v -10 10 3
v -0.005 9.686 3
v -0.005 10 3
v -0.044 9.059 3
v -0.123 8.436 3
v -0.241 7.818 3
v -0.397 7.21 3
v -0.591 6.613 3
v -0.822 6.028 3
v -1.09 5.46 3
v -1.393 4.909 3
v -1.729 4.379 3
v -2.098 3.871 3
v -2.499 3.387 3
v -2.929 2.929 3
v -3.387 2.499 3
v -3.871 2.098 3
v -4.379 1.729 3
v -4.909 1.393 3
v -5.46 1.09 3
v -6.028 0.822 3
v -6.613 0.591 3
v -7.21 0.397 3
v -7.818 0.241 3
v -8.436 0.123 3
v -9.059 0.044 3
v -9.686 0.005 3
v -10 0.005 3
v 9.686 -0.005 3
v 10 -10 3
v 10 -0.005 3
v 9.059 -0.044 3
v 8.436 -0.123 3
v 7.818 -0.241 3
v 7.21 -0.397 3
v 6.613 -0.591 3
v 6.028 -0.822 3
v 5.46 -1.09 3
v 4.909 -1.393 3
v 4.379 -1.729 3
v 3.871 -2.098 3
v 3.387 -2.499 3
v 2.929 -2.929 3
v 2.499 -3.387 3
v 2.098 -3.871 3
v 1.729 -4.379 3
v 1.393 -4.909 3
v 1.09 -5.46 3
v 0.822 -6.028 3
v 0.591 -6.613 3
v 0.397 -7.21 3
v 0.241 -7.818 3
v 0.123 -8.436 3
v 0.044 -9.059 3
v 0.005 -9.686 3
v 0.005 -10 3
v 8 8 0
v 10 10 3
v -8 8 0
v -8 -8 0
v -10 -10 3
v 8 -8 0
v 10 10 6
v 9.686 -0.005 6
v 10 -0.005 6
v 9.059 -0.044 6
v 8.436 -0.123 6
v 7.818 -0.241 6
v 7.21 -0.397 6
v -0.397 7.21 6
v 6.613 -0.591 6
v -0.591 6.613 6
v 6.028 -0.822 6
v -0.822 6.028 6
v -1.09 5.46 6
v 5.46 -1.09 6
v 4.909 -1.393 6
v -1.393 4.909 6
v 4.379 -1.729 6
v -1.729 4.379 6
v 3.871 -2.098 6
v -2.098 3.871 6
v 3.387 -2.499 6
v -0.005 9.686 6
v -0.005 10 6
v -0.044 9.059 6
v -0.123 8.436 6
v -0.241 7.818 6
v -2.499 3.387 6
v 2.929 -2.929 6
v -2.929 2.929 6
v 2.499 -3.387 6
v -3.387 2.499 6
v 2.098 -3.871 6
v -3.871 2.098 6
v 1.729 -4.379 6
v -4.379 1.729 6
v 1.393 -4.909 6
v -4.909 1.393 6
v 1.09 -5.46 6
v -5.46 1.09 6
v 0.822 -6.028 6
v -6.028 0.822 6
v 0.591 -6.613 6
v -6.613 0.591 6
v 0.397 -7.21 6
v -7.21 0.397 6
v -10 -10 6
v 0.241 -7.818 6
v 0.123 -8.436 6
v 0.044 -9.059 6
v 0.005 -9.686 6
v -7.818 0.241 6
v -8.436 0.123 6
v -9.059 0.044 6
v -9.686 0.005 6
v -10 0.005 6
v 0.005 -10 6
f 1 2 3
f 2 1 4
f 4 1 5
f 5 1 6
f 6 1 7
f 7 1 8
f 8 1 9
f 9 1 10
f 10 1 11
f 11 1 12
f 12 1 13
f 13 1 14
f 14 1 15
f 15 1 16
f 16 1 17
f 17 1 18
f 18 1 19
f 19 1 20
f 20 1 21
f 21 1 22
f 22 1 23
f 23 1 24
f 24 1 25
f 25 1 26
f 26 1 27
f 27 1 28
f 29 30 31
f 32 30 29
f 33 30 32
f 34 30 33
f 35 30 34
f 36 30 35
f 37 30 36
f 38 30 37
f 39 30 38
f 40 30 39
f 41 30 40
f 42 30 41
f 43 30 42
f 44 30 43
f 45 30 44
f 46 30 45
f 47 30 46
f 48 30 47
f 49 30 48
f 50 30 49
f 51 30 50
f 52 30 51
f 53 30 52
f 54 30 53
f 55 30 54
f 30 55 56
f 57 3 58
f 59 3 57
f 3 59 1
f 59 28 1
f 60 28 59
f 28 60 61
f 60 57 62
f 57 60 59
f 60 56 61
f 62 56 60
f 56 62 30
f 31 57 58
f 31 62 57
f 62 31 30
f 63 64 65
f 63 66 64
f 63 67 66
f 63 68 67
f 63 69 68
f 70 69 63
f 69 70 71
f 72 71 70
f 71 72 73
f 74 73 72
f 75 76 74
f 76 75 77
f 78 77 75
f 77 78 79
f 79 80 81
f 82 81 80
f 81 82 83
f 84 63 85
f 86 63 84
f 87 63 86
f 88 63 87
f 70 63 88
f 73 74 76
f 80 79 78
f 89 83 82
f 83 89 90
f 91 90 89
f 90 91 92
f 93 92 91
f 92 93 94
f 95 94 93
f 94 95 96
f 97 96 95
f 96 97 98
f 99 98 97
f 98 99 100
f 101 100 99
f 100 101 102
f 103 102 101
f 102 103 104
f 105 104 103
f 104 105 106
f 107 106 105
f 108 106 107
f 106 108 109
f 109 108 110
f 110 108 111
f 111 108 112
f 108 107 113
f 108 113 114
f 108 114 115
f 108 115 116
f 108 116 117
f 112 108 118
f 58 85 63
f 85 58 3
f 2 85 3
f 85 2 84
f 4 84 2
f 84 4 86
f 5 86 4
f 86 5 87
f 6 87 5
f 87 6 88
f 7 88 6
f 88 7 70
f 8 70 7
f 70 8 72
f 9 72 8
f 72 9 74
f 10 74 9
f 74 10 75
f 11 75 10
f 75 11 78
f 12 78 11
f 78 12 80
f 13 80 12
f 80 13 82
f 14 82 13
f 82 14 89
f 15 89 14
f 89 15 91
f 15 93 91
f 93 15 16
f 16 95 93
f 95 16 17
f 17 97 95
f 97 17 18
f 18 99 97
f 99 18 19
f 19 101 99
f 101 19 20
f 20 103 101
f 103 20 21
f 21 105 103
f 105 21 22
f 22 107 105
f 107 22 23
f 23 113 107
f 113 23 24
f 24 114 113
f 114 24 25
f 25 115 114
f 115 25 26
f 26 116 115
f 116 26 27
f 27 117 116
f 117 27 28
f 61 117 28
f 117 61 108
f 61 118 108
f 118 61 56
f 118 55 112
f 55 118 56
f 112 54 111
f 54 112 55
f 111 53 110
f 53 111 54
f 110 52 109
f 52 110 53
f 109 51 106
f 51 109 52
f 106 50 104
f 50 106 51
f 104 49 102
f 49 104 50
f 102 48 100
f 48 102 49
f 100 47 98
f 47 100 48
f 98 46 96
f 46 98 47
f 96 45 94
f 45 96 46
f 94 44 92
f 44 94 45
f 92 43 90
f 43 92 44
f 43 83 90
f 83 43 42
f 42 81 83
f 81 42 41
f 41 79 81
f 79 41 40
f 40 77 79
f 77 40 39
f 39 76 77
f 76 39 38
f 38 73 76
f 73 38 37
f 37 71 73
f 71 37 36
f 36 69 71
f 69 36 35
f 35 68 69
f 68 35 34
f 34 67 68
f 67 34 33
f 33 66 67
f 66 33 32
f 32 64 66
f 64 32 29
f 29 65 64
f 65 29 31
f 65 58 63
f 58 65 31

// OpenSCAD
// height of the curvy part as a proportion of the height of the base
h=1; // [0:0.01:5]
// ratio between diammeters of bottom and top
bevel=0.8; // [0:0.01:1]
// length of each edge
size=20; // [0:1:100]
// height of the tile
depth=6; // [0:1:30]
// the number of sides
sides=4; // [4,6,8,12]
// which tile to use (there are 2 squares, 3 hexagons, 6 octagons; 28 dodecagons)
tile=0;

module arc(n,i1,i2) {
    d = 2*(i2-i1);
    if(d==n) {
        an = 360*(i1+i2+1)/2/n;
        p = [cos(an),sin(an)];
        difference() {
            circle(1,$fn=100);
            rotate(an) translate([-2,-1,0]) square(2);
        }
    } else if(d>n) {
        difference() {
            circle(1,$fn=100);
            arc(n,i2,i1+n);
        }
    } else {
        a1 = 360*(i1+.5)/n;
        a2 = 360*(i2+.5)/n;
        inradius = sin(180*(n-2)/n/2);
        p1 = [cos(a1),sin(a1)];
        p2 = [cos(a2),sin(a2)];
        w = p1[0]*p2[1]-p1[1]*p2[0];
        R = cos(180/n);

        p = R/w*[-p1[1]+p2[1], -p2[0]+p1[0]];
        aR = norm(inradius*p1-p);
        
        translate(p) circle(aR,$fn=100);
    }
}

module combine_arcs(n,i1,i2,subarcs) {
    difference() {
        arc(n,i1,i2);
        for(s=subarcs) {
            combine_arcs(n,s[0],s[1],s[2]);
        }
    };
}


tilesets = [[[[0,1,[]],[2,3,[]]],[[0,3,[[1,2,[]]]]]],[[[0,1,[]],[2,3,[]],[4,5,[]]],[[0,1,[]],[2,5,[[3,4,[]]]]],[[0,5,[[1,2,[]],[3,4,[]]]]]],[[[0,1,[]],[2,3,[]],[4,5,[]],[6,7,[]]],[[0,1,[]],[2,3,[]],[4,7,[[5,6,[]]]]],[[0,1,[]],[2,7,[[3,4,[]],[5,6,[]]]]],[[0,1,[]],[2,7,[[3,6,[[4,5,[]]]]]]],[[0,3,[[1,2,[]]]],[4,7,[[5,6,[]]]]],[[0,7,[[1,2,[]],[3,4,[]],[5,6,[]]]]]],[[[0,1,[]],[2,3,[]],[4,5,[]],[6,7,[]],[8,9,[]]],[[0,1,[]],[2,3,[]],[4,5,[]],[6,9,[[7,8,[]]]]],[[0,1,[]],[2,3,[]],[4,9,[[5,6,[]],[7,8,[]]]]],[[0,1,[]],[2,3,[]],[4,9,[[5,8,[[6,7,[]]]]]]],[[0,1,[]],[2,5,[[3,4,[]]]],[6,9,[[7,8,[]]]]],[[0,1,[]],[2,9,[[3,4,[]],[5,6,[]],[7,8,[]]]]],[[0,1,[]],[2,9,[[3,4,[]],[5,8,[[6,7,[]]]]]]],[[0,3,[[1,2,[]]]],[4,9,[[5,6,[]],[7,8,[]]]]],[[0,3,[[1,2,[]]]],[4,9,[[5,8,[[6,7,[]]]]]]],[[0,9,[[1,2,[]],[3,4,[]],[5,6,[]],[7,8,[]]]]]],[[[0,1,[]],[2,3,[]],[4,5,[]],[6,7,[]],[8,9,[]],[10,11,[]]],[[0,1,[]],[2,3,[]],[4,5,[]],[6,7,[]],[8,11,[[9,10,[]]]]],[[0,1,[]],[2,3,[]],[4,5,[]],[6,11,[[7,8,[]],[9,10,[]]]]],[[0,1,[]],[2,3,[]],[4,5,[]],[6,11,[[7,10,[[8,9,[]]]]]]],[[0,1,[]],[2,3,[]],[4,7,[[5,6,[]]]],[8,11,[[9,10,[]]]]],[[0,1,[]],[2,3,[]],[4,11,[[5,6,[]],[7,8,[]],[9,10,[]]]]],[[0,1,[]],[2,3,[]],[4,11,[[5,6,[]],[7,10,[[8,9,[]]]]]]],[[0,1,[]],[2,3,[]],[4,11,[[5,8,[[6,7,[]]]],[9,10,[]]]]],[[0,1,[]],[2,3,[]],[4,11,[[5,10,[[6,7,[]],[8,9,[]]]]]]],[[0,1,[]],[2,3,[]],[4,11,[[5,10,[[6,9,[[7,8,[]]]]]]]]],[[0,1,[]],[2,5,[[3,4,[]]]],[6,7,[]],[8,11,[[9,10,[]]]]],[[0,1,[]],[2,5,[[3,4,[]]]],[6,11,[[7,8,[]],[9,10,[]]]]],[[0,1,[]],[2,5,[[3,4,[]]]],[6,11,[[7,10,[[8,9,[]]]]]]],[[0,1,[]],[2,7,[[3,4,[]],[5,6,[]]]],[8,11,[[9,10,[]]]]],[[0,1,[]],[2,7,[[3,6,[[4,5,[]]]]]],[8,11,[[9,10,[]]]]],[[0,1,[]],[2,11,[[3,4,[]],[5,6,[]],[7,8,[]],[9,10,[]]]]],[[0,1,[]],[2,11,[[3,4,[]],[5,6,[]],[7,10,[[8,9,[]]]]]]],[[0,1,[]],[2,11,[[3,4,[]],[5,8,[[6,7,[]]]],[9,10,[]]]]],[[0,1,[]],[2,11,[[3,4,[]],[5,10,[[6,9,[[7,8,[]]]]]]]]],[[0,1,[]],[2,11,[[3,6,[[4,5,[]]]],[7,10,[[8,9,[]]]]]]],[[0,1,[]],[2,11,[[3,8,[[4,7,[[5,6,[]]]]]],[9,10,[]]]]],[[0,1,[]],[2,11,[[3,10,[[4,9,[[5,6,[]],[7,8,[]]]]]]]]],[[0,1,[]],[2,11,[[3,10,[[4,9,[[5,8,[[6,7,[]]]]]]]]]]],[[0,3,[[1,2,[]]]],[4,7,[[5,6,[]]]],[8,11,[[9,10,[]]]]],[[0,3,[[1,2,[]]]],[4,11,[[5,6,[]],[7,8,[]],[9,10,[]]]]],[[0,3,[[1,2,[]]]],[4,11,[[5,10,[[6,9,[[7,8,[]]]]]]]]],[[0,5,[[1,2,[]],[3,4,[]]]],[6,11,[[7,8,[]],[9,10,[]]]]],[[0,11,[[1,2,[]],[3,4,[]],[5,6,[]],[7,8,[]],[9,10,[]]]]]],[[[0,1,[]],[2,3,[]],[4,5,[]],[6,7,[]],[8,9,[]],[10,11,[]],[12,13,[]]],[[0,1,[]],[2,3,[]],[4,5,[]],[6,7,[]],[8,9,[]],[10,13,[[11,12,[]]]]],[[0,1,[]],[2,3,[]],[4,5,[]],[6,7,[]],[8,13,[[9,10,[]],[11,12,[]]]]],[[0,1,[]],[2,3,[]],[4,5,[]],[6,7,[]],[8,13,[[9,12,[[10,11,[]]]]]]],[[0,1,[]],[2,3,[]],[4,5,[]],[6,9,[[7,8,[]]]],[10,13,[[11,12,[]]]]],[[0,1,[]],[2,3,[]],[4,5,[]],[6,13,[[7,8,[]],[9,10,[]],[11,12,[]]]]],[[0,1,[]],[2,3,[]],[4,5,[]],[6,13,[[7,8,[]],[9,12,[[10,11,[]]]]]]],[[0,1,[]],[2,3,[]],[4,5,[]],[6,13,[[7,10,[[8,9,[]]]],[11,12,[]]]]],[[0,1,[]],[2,3,[]],[4,5,[]],[6,13,[[7,12,[[8,9,[]],[10,11,[]]]]]]],[[0,1,[]],[2,3,[]],[4,5,[]],[6,13,[[7,12,[[8,11,[[9,10,[]]]]]]]]],[[0,1,[]],[2,3,[]],[4,7,[[5,6,[]]]],[8,9,[]],[10,13,[[11,12,[]]]]],[[0,1,[]],[2,3,[]],[4,7,[[5,6,[]]]],[8,13,[[9,10,[]],[11,12,[]]]]],[[0,1,[]],[2,3,[]],[4,7,[[5,6,[]]]],[8,13,[[9,12,[[10,11,[]]]]]]],[[0,1,[]],[2,3,[]],[4,9,[[5,6,[]],[7,8,[]]]],[10,13,[[11,12,[]]]]],[[0,1,[]],[2,3,[]],[4,9,[[5,8,[[6,7,[]]]]]],[10,13,[[11,12,[]]]]],[[0,1,[]],[2,3,[]],[4,13,[[5,6,[]],[7,8,[]],[9,10,[]],[11,12,[]]]]],[[0,1,[]],[2,3,[]],[4,13,[[5,6,[]],[7,8,[]],[9,12,[[10,11,[]]]]]]],[[0,1,[]],[2,3,[]],[4,13,[[5,6,[]],[7,10,[[8,9,[]]]],[11,12,[]]]]],[[0,1,[]],[2,3,[]],[4,13,[[5,6,[]],[7,12,[[8,9,[]],[10,11,[]]]]]]],[[0,1,[]],[2,3,[]],[4,13,[[5,6,[]],[7,12,[[8,11,[[9,10,[]]]]]]]]],[[0,1,[]],[2,3,[]],[4,13,[[5,8,[[6,7,[]]]],[9,10,[]],[11,12,[]]]]],[[0,1,[]],[2,3,[]],[4,13,[[5,8,[[6,7,[]]]],[9,12,[[10,11,[]]]]]]],[[0,1,[]],[2,3,[]],[4,13,[[5,10,[[6,9,[[7,8,[]]]]]],[11,12,[]]]]],[[0,1,[]],[2,5,[[3,4,[]]]],[6,7,[]],[8,13,[[9,10,[]],[11,12,[]]]]],[[0,1,[]],[2,5,[[3,4,[]]]],[6,7,[]],[8,13,[[9,12,[[10,11,[]]]]]]],[[0,1,[]],[2,5,[[3,4,[]]]],[6,9,[[7,8,[]]]],[10,13,[[11,12,[]]]]],[[0,1,[]],[2,5,[[3,4,[]]]],[6,13,[[7,8,[]],[9,10,[]],[11,12,[]]]]],[[0,1,[]],[2,5,[[3,4,[]]]],[6,13,[[7,8,[]],[9,12,[[10,11,[]]]]]]],[[0,1,[]],[2,5,[[3,4,[]]]],[6,13,[[7,10,[[8,9,[]]]],[11,12,[]]]]],[[0,1,[]],[2,5,[[3,4,[]]]],[6,13,[[7,12,[[8,9,[]],[10,11,[]]]]]]],[[0,1,[]],[2,5,[[3,4,[]]]],[6,13,[[7,12,[[8,11,[[9,10,[]]]]]]]]],[[0,1,[]],[2,7,[[3,4,[]],[5,6,[]]]],[8,13,[[9,10,[]],[11,12,[]]]]],[[0,1,[]],[2,7,[[3,6,[[4,5,[]]]]]],[8,13,[[9,10,[]],[11,12,[]]]]],[[0,1,[]],[2,7,[[3,4,[]],[5,6,[]]]],[8,13,[[9,12,[[10,11,[]]]]]]],[[0,1,[]],[2,7,[[3,6,[[4,5,[]]]]]],[8,13,[[9,12,[[10,11,[]]]]]]],[[0,1,[]],[2,9,[[3,4,[]],[5,6,[]],[7,8,[]]]],[10,13,[[11,12,[]]]]],[[0,1,[]],[2,9,[[3,4,[]],[5,8,[[6,7,[]]]]]],[10,13,[[11,12,[]]]]],[[0,1,[]],[2,9,[[3,6,[[4,5,[]]]],[7,8,[]]]],[10,13,[[11,12,[]]]]],[[0,1,[]],[2,9,[[3,8,[[4,5,[]],[6,7,[]]]]]],[10,13,[[11,12,[]]]]],[[0,1,[]],[2,9,[[3,8,[[4,7,[[5,6,[]]]]]]]],[10,13,[[11,12,[]]]]],[[0,1,[]],[2,13,[[3,4,[]],[5,6,[]],[7,8,[]],[9,10,[]],[11,12,[]]]]],[[0,1,[]],[2,13,[[3,4,[]],[5,6,[]],[7,8,[]],[9,12,[[10,11,[]]]]]]],[[0,1,[]],[2,13,[[3,4,[]],[5,6,[]],[7,10,[[8,9,[]]]],[11,12,[]]]]],[[0,1,[]],[2,13,[[3,4,[]],[5,6,[]],[7,12,[[8,11,[[9,10,[]]]]]]]]],[[0,1,[]],[2,13,[[3,4,[]],[5,8,[[6,7,[]]]],[9,12,[[10,11,[]]]]]]],[[0,1,[]],[2,13,[[3,4,[]],[5,10,[[6,9,[[7,8,[]]]]]],[11,12,[]]]]],[[0,1,[]],[2,13,[[3,6,[[4,5,[]]]],[7,12,[[8,11,[[9,10,[]]]]]]]]],[[0,1,[]],[2,13,[[3,8,[[4,7,[[5,6,[]]]]]],[9,10,[]],[11,12,[]]]]],[[0,1,[]],[2,13,[[3,12,[[4,7,[[5,6,[]]]],[8,11,[[9,10,[]]]]]]]]],[[0,1,[]],[2,13,[[3,12,[[4,11,[[5,6,[]],[7,8,[]],[9,10,[]]]]]]]]],[[0,1,[]],[2,13,[[3,12,[[4,11,[[5,6,[]],[7,10,[[8,9,[]]]]]]]]]]],[[0,1,[]],[2,13,[[3,12,[[4,11,[[5,8,[[6,7,[]]]],[9,10,[]]]]]]]]],[[0,1,[]],[2,13,[[3,12,[[4,11,[[5,10,[[6,7,[]],[8,9,[]]]]]]]]]]],[[0,1,[]],[2,13,[[3,12,[[4,11,[[5,10,[[6,9,[[7,8,[]]]]]]]]]]]]],[[0,3,[[1,2,[]]]],[4,7,[[5,6,[]]]],[8,13,[[9,10,[]],[11,12,[]]]]],[[0,3,[[1,2,[]]]],[4,13,[[5,6,[]],[7,8,[]],[9,10,[]],[11,12,[]]]]],[[0,3,[[1,2,[]]]],[4,13,[[5,6,[]],[7,12,[[8,11,[[9,10,[]]]]]]]]],[[0,5,[[1,2,[]],[3,4,[]]]],[6,13,[[7,8,[]],[9,10,[]],[11,12,[]]]]],[[0,5,[[1,2,[]],[3,4,[]]]],[6,13,[[7,8,[]],[9,12,[[10,11,[]]]]]]],[[0,5,[[1,2,[]],[3,4,[]]]],[6,13,[[7,10,[[8,9,[]]]],[11,12,[]]]]],[[0,5,[[1,2,[]],[3,4,[]]]],[6,13,[[7,12,[[8,9,[]],[10,11,[]]]]]]],[[0,5,[[1,2,[]],[3,4,[]]]],[6,13,[[7,12,[[8,11,[[9,10,[]]]]]]]]],[[0,13,[[1,2,[]],[3,4,[]],[5,6,[]],[7,8,[]],[9,10,[]],[11,12,[]]]]]]]
;

echo(len(tilesets));
for(i=[0:len(tilesets)]) {
    echo(i,len(tilesets[i]));
}

module make(set,tile) {
    n = 2*set+4;
    arcs = tilesets[set][tile];
    points = [for (i = [0:n]) [cos(360*i/n),sin(360*i/n)]];
    rotate(180/n) scale([radius(n),radius(n),1]) union() {
        difference() {
            translate([0,0,1]) mirror([0,0,1]) linear_extrude(1,scale=bevel) polygon(points);
        }
        translate([0,0,1]) linear_extrude(h) difference() {
            polygon(points);
            for(a=arcs) {
                combine_arcs(n,a[0],a[1],a[2]);
            }
        };
    }
}

function radius(n) = 1/(2*sin(180/n));

set=(sides-4)/2; 
scale([size,size,depth/(1+h)]) make(set,tile);
